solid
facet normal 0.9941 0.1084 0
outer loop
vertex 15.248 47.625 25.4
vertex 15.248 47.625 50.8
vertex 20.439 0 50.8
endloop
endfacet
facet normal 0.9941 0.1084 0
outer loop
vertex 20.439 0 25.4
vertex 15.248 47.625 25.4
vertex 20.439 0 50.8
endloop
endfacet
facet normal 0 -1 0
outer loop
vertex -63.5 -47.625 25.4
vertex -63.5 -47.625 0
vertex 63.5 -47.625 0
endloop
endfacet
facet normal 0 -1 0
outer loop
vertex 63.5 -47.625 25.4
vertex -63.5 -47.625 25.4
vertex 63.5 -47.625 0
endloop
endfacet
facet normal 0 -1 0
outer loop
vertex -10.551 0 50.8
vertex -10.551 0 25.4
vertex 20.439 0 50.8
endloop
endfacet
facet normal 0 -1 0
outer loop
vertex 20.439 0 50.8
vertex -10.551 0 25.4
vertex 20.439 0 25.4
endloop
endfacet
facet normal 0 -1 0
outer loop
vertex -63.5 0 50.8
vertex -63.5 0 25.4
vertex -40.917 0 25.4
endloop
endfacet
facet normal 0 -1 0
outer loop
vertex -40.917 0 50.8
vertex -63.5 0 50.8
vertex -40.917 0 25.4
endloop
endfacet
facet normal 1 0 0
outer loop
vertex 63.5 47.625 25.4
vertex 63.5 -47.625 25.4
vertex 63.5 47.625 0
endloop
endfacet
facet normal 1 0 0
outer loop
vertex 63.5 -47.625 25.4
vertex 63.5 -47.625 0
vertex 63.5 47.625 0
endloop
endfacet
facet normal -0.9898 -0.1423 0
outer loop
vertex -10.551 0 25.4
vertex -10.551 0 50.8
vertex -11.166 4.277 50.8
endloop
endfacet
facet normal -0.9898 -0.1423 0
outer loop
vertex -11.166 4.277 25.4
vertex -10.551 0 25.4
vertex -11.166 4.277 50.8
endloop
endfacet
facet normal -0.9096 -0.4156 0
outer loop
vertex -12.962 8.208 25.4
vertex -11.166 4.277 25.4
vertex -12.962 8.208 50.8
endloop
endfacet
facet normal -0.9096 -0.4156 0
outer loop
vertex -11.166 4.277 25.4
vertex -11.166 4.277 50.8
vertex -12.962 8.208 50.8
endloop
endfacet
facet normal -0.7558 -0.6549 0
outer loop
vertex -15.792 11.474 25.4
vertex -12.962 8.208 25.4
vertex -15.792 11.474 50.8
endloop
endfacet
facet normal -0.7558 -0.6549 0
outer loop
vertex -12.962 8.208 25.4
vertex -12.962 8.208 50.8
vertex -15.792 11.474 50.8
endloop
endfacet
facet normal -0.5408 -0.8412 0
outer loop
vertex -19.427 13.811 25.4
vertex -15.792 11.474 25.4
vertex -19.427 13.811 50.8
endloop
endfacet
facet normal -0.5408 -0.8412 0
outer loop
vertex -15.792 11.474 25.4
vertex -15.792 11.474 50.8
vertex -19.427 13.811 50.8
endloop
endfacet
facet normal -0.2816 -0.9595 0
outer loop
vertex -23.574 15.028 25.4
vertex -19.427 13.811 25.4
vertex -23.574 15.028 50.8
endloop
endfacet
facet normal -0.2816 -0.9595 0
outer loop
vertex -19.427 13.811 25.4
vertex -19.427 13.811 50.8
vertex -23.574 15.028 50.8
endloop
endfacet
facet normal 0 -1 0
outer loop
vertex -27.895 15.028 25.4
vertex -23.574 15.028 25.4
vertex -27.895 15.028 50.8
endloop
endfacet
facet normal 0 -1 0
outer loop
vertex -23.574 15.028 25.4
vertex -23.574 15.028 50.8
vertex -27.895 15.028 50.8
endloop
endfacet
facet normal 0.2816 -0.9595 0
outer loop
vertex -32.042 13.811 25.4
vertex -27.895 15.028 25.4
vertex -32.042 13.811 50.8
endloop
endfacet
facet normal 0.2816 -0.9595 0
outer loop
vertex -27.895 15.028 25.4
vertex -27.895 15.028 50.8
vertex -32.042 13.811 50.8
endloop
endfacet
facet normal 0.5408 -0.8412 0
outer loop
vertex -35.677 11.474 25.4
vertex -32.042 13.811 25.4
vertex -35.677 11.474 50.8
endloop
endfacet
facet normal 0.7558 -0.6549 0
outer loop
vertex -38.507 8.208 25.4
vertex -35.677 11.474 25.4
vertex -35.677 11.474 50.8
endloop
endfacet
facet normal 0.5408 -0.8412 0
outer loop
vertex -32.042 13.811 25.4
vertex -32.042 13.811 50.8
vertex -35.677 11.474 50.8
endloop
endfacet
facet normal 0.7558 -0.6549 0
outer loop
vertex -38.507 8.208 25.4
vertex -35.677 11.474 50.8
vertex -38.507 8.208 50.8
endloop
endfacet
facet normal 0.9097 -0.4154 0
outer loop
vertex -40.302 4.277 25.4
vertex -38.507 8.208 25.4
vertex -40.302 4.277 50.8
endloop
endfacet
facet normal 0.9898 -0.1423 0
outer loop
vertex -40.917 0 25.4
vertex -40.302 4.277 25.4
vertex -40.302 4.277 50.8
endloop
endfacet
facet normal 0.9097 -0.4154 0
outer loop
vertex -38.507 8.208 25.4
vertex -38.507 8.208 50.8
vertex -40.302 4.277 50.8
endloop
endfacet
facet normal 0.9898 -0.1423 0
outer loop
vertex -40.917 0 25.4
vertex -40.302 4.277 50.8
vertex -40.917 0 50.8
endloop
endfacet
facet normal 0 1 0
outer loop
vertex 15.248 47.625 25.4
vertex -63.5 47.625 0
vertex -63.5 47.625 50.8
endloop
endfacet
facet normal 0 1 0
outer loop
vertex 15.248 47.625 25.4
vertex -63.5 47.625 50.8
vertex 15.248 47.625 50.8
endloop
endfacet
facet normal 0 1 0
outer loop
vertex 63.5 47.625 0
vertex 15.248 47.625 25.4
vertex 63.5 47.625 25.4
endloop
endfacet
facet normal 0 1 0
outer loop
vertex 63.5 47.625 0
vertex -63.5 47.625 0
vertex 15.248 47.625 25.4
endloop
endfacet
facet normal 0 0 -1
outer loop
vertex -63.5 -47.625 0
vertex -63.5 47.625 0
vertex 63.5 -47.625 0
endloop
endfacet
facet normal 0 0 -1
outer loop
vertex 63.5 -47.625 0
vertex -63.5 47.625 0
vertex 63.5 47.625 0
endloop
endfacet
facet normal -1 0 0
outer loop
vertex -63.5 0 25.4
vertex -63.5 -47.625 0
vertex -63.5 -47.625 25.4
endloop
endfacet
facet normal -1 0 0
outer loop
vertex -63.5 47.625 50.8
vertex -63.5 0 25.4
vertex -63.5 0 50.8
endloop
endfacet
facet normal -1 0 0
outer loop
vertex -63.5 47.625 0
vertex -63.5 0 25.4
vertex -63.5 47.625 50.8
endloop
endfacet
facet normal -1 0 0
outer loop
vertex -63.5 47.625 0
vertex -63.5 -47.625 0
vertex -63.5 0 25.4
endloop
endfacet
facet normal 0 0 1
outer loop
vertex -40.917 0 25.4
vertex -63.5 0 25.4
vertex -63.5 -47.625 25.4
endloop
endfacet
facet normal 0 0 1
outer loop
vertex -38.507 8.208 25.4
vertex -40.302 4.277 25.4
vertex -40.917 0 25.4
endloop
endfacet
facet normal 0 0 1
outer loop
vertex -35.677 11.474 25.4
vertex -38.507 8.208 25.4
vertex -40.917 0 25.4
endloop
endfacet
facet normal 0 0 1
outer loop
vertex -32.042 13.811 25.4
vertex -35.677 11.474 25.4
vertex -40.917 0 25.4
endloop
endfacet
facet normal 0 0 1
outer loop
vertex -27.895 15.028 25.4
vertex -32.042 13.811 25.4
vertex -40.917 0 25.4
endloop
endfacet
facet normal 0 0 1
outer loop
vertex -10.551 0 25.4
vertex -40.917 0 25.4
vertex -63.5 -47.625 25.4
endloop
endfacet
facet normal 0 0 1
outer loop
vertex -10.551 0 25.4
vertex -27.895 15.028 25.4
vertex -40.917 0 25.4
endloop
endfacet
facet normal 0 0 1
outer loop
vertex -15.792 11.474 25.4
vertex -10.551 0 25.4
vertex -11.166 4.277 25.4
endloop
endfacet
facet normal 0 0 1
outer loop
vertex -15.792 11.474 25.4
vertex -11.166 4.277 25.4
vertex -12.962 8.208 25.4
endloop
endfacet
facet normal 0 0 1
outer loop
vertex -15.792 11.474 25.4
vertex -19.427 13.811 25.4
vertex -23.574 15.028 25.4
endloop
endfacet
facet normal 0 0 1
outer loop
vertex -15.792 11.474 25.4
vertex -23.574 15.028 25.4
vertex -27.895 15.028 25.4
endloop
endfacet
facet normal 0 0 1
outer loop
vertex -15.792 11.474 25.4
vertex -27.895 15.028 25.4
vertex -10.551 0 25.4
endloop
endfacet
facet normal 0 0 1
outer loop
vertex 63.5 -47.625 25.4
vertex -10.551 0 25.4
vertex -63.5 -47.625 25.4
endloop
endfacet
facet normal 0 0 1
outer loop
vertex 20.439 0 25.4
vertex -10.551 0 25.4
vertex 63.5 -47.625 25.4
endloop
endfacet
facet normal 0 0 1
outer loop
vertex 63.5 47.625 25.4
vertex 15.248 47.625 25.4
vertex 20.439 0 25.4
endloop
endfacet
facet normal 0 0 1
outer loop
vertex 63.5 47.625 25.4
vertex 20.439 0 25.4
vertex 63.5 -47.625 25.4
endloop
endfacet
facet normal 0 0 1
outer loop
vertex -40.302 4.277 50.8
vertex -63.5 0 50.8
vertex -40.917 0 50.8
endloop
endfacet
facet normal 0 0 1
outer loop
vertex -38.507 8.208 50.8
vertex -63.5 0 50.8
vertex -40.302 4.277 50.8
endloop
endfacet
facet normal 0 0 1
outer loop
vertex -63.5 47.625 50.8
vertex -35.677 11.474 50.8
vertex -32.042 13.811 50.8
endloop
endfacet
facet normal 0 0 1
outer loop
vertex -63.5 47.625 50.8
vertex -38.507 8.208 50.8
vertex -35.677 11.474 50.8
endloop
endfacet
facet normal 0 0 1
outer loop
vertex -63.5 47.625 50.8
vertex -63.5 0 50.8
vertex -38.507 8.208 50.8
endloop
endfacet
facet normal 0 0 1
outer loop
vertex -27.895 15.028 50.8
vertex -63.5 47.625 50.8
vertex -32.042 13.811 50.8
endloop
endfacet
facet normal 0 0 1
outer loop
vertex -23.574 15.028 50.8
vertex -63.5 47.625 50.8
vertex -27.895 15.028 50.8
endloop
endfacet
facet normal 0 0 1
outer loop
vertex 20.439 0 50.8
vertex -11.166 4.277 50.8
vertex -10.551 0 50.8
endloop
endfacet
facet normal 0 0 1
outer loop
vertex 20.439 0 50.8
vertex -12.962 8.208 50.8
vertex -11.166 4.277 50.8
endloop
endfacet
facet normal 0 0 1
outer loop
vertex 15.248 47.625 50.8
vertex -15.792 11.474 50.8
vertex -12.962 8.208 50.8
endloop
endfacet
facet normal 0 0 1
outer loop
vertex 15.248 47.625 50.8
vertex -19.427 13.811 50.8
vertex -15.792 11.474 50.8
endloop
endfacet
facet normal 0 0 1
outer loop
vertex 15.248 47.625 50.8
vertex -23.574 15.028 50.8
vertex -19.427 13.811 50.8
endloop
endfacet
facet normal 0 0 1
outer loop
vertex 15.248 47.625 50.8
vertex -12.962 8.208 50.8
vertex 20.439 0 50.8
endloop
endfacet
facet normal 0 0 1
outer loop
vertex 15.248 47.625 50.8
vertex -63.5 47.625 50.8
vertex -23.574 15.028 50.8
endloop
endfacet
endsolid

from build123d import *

# Parameters (mm, degrees)
F0_W     = 127
F0_H     = 95.25
F1_DEPTH = 25.4
F2_W     = 127
F2_H     = 47.6253371388
F3_DEPTH = 25.4
F5_DEPTH = 25.4


with BuildPart() as f1:
    # F0 (on Top) → F1 (new body)
    with BuildSketch(Plane.XY):
        Rectangle(F0_W, F0_H)
    extrude(amount=F1_DEPTH)

    # F2 (on face) → F3 (join)
    with BuildSketch(Plane.XY.offset(25.4)):
        with Locations((0, 23.8123314306)):
            Rectangle(F2_W, F2_H)
    extrude(amount=F3_DEPTH)

    # F4 (on face) → F5 (cut)
    with BuildSketch(Plane.XY.offset(50.8)):
        with BuildLine():
            Line((-40.9172700879, -0.0003371388), (-10.551281071, -0.0003371388))
            ThreePointArc((-10.551281071, -0.0003371388), (-25.7342755795, 15.1826573697), (-40.9172700879, -0.0003371388))
        make_face()
        Polygon((63.5, 47.625), (15.2478702366, 47.625), (20.4385407269, -0.0003371388), (63.5, -0.0003371388), align=None)
    extrude(amount=-F5_DEPTH, mode=Mode.SUBTRACT)


solid = f1.part
